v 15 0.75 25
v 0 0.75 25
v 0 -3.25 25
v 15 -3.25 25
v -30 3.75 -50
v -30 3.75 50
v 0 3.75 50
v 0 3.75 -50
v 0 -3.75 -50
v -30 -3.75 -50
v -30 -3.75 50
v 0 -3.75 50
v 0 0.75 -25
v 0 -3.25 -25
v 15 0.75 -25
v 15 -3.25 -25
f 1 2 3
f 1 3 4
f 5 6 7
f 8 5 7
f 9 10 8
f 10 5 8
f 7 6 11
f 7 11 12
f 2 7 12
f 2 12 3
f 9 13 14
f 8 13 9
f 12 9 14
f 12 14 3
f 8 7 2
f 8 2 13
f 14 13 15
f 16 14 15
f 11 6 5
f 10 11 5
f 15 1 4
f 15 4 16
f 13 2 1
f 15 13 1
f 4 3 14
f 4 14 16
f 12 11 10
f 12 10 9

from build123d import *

# Parameters (mm, degrees)
SKETCH1_W           = 30
SKETCH1_H           = 100
BOSS_EXTRUDE1_DEPTH = 3.75
BOSS_EXTRUDE2_START = -3
SKETCH2_W           = 15
SKETCH2_H           = 50
BOSS_EXTRUDE2_DEPTH = 4


with BuildPart() as part:
    # Sketch1 → Boss-Extrude1 (new, symmetric)
    with BuildSketch(Plane(origin=(0, 0, 0), x_dir=(1, 0, 0), z_dir=(0, 1, 0))):
        with Locations((-15, 0)):
            Rectangle(SKETCH1_W, SKETCH1_H)
    extrude(amount=BOSS_EXTRUDE1_DEPTH, both=True)

    # Sketch2 → Boss-Extrude2 (add)
    with BuildSketch(Plane(origin=(0, 3.75, 0), x_dir=(1, 0, 0), z_dir=(0, 1, 0)).offset(BOSS_EXTRUDE2_START)):
        with Locations((7.5, 0)):
            Rectangle(SKETCH2_W, SKETCH2_H)
    extrude(amount=-BOSS_EXTRUDE2_DEPTH)


solid = part.part
